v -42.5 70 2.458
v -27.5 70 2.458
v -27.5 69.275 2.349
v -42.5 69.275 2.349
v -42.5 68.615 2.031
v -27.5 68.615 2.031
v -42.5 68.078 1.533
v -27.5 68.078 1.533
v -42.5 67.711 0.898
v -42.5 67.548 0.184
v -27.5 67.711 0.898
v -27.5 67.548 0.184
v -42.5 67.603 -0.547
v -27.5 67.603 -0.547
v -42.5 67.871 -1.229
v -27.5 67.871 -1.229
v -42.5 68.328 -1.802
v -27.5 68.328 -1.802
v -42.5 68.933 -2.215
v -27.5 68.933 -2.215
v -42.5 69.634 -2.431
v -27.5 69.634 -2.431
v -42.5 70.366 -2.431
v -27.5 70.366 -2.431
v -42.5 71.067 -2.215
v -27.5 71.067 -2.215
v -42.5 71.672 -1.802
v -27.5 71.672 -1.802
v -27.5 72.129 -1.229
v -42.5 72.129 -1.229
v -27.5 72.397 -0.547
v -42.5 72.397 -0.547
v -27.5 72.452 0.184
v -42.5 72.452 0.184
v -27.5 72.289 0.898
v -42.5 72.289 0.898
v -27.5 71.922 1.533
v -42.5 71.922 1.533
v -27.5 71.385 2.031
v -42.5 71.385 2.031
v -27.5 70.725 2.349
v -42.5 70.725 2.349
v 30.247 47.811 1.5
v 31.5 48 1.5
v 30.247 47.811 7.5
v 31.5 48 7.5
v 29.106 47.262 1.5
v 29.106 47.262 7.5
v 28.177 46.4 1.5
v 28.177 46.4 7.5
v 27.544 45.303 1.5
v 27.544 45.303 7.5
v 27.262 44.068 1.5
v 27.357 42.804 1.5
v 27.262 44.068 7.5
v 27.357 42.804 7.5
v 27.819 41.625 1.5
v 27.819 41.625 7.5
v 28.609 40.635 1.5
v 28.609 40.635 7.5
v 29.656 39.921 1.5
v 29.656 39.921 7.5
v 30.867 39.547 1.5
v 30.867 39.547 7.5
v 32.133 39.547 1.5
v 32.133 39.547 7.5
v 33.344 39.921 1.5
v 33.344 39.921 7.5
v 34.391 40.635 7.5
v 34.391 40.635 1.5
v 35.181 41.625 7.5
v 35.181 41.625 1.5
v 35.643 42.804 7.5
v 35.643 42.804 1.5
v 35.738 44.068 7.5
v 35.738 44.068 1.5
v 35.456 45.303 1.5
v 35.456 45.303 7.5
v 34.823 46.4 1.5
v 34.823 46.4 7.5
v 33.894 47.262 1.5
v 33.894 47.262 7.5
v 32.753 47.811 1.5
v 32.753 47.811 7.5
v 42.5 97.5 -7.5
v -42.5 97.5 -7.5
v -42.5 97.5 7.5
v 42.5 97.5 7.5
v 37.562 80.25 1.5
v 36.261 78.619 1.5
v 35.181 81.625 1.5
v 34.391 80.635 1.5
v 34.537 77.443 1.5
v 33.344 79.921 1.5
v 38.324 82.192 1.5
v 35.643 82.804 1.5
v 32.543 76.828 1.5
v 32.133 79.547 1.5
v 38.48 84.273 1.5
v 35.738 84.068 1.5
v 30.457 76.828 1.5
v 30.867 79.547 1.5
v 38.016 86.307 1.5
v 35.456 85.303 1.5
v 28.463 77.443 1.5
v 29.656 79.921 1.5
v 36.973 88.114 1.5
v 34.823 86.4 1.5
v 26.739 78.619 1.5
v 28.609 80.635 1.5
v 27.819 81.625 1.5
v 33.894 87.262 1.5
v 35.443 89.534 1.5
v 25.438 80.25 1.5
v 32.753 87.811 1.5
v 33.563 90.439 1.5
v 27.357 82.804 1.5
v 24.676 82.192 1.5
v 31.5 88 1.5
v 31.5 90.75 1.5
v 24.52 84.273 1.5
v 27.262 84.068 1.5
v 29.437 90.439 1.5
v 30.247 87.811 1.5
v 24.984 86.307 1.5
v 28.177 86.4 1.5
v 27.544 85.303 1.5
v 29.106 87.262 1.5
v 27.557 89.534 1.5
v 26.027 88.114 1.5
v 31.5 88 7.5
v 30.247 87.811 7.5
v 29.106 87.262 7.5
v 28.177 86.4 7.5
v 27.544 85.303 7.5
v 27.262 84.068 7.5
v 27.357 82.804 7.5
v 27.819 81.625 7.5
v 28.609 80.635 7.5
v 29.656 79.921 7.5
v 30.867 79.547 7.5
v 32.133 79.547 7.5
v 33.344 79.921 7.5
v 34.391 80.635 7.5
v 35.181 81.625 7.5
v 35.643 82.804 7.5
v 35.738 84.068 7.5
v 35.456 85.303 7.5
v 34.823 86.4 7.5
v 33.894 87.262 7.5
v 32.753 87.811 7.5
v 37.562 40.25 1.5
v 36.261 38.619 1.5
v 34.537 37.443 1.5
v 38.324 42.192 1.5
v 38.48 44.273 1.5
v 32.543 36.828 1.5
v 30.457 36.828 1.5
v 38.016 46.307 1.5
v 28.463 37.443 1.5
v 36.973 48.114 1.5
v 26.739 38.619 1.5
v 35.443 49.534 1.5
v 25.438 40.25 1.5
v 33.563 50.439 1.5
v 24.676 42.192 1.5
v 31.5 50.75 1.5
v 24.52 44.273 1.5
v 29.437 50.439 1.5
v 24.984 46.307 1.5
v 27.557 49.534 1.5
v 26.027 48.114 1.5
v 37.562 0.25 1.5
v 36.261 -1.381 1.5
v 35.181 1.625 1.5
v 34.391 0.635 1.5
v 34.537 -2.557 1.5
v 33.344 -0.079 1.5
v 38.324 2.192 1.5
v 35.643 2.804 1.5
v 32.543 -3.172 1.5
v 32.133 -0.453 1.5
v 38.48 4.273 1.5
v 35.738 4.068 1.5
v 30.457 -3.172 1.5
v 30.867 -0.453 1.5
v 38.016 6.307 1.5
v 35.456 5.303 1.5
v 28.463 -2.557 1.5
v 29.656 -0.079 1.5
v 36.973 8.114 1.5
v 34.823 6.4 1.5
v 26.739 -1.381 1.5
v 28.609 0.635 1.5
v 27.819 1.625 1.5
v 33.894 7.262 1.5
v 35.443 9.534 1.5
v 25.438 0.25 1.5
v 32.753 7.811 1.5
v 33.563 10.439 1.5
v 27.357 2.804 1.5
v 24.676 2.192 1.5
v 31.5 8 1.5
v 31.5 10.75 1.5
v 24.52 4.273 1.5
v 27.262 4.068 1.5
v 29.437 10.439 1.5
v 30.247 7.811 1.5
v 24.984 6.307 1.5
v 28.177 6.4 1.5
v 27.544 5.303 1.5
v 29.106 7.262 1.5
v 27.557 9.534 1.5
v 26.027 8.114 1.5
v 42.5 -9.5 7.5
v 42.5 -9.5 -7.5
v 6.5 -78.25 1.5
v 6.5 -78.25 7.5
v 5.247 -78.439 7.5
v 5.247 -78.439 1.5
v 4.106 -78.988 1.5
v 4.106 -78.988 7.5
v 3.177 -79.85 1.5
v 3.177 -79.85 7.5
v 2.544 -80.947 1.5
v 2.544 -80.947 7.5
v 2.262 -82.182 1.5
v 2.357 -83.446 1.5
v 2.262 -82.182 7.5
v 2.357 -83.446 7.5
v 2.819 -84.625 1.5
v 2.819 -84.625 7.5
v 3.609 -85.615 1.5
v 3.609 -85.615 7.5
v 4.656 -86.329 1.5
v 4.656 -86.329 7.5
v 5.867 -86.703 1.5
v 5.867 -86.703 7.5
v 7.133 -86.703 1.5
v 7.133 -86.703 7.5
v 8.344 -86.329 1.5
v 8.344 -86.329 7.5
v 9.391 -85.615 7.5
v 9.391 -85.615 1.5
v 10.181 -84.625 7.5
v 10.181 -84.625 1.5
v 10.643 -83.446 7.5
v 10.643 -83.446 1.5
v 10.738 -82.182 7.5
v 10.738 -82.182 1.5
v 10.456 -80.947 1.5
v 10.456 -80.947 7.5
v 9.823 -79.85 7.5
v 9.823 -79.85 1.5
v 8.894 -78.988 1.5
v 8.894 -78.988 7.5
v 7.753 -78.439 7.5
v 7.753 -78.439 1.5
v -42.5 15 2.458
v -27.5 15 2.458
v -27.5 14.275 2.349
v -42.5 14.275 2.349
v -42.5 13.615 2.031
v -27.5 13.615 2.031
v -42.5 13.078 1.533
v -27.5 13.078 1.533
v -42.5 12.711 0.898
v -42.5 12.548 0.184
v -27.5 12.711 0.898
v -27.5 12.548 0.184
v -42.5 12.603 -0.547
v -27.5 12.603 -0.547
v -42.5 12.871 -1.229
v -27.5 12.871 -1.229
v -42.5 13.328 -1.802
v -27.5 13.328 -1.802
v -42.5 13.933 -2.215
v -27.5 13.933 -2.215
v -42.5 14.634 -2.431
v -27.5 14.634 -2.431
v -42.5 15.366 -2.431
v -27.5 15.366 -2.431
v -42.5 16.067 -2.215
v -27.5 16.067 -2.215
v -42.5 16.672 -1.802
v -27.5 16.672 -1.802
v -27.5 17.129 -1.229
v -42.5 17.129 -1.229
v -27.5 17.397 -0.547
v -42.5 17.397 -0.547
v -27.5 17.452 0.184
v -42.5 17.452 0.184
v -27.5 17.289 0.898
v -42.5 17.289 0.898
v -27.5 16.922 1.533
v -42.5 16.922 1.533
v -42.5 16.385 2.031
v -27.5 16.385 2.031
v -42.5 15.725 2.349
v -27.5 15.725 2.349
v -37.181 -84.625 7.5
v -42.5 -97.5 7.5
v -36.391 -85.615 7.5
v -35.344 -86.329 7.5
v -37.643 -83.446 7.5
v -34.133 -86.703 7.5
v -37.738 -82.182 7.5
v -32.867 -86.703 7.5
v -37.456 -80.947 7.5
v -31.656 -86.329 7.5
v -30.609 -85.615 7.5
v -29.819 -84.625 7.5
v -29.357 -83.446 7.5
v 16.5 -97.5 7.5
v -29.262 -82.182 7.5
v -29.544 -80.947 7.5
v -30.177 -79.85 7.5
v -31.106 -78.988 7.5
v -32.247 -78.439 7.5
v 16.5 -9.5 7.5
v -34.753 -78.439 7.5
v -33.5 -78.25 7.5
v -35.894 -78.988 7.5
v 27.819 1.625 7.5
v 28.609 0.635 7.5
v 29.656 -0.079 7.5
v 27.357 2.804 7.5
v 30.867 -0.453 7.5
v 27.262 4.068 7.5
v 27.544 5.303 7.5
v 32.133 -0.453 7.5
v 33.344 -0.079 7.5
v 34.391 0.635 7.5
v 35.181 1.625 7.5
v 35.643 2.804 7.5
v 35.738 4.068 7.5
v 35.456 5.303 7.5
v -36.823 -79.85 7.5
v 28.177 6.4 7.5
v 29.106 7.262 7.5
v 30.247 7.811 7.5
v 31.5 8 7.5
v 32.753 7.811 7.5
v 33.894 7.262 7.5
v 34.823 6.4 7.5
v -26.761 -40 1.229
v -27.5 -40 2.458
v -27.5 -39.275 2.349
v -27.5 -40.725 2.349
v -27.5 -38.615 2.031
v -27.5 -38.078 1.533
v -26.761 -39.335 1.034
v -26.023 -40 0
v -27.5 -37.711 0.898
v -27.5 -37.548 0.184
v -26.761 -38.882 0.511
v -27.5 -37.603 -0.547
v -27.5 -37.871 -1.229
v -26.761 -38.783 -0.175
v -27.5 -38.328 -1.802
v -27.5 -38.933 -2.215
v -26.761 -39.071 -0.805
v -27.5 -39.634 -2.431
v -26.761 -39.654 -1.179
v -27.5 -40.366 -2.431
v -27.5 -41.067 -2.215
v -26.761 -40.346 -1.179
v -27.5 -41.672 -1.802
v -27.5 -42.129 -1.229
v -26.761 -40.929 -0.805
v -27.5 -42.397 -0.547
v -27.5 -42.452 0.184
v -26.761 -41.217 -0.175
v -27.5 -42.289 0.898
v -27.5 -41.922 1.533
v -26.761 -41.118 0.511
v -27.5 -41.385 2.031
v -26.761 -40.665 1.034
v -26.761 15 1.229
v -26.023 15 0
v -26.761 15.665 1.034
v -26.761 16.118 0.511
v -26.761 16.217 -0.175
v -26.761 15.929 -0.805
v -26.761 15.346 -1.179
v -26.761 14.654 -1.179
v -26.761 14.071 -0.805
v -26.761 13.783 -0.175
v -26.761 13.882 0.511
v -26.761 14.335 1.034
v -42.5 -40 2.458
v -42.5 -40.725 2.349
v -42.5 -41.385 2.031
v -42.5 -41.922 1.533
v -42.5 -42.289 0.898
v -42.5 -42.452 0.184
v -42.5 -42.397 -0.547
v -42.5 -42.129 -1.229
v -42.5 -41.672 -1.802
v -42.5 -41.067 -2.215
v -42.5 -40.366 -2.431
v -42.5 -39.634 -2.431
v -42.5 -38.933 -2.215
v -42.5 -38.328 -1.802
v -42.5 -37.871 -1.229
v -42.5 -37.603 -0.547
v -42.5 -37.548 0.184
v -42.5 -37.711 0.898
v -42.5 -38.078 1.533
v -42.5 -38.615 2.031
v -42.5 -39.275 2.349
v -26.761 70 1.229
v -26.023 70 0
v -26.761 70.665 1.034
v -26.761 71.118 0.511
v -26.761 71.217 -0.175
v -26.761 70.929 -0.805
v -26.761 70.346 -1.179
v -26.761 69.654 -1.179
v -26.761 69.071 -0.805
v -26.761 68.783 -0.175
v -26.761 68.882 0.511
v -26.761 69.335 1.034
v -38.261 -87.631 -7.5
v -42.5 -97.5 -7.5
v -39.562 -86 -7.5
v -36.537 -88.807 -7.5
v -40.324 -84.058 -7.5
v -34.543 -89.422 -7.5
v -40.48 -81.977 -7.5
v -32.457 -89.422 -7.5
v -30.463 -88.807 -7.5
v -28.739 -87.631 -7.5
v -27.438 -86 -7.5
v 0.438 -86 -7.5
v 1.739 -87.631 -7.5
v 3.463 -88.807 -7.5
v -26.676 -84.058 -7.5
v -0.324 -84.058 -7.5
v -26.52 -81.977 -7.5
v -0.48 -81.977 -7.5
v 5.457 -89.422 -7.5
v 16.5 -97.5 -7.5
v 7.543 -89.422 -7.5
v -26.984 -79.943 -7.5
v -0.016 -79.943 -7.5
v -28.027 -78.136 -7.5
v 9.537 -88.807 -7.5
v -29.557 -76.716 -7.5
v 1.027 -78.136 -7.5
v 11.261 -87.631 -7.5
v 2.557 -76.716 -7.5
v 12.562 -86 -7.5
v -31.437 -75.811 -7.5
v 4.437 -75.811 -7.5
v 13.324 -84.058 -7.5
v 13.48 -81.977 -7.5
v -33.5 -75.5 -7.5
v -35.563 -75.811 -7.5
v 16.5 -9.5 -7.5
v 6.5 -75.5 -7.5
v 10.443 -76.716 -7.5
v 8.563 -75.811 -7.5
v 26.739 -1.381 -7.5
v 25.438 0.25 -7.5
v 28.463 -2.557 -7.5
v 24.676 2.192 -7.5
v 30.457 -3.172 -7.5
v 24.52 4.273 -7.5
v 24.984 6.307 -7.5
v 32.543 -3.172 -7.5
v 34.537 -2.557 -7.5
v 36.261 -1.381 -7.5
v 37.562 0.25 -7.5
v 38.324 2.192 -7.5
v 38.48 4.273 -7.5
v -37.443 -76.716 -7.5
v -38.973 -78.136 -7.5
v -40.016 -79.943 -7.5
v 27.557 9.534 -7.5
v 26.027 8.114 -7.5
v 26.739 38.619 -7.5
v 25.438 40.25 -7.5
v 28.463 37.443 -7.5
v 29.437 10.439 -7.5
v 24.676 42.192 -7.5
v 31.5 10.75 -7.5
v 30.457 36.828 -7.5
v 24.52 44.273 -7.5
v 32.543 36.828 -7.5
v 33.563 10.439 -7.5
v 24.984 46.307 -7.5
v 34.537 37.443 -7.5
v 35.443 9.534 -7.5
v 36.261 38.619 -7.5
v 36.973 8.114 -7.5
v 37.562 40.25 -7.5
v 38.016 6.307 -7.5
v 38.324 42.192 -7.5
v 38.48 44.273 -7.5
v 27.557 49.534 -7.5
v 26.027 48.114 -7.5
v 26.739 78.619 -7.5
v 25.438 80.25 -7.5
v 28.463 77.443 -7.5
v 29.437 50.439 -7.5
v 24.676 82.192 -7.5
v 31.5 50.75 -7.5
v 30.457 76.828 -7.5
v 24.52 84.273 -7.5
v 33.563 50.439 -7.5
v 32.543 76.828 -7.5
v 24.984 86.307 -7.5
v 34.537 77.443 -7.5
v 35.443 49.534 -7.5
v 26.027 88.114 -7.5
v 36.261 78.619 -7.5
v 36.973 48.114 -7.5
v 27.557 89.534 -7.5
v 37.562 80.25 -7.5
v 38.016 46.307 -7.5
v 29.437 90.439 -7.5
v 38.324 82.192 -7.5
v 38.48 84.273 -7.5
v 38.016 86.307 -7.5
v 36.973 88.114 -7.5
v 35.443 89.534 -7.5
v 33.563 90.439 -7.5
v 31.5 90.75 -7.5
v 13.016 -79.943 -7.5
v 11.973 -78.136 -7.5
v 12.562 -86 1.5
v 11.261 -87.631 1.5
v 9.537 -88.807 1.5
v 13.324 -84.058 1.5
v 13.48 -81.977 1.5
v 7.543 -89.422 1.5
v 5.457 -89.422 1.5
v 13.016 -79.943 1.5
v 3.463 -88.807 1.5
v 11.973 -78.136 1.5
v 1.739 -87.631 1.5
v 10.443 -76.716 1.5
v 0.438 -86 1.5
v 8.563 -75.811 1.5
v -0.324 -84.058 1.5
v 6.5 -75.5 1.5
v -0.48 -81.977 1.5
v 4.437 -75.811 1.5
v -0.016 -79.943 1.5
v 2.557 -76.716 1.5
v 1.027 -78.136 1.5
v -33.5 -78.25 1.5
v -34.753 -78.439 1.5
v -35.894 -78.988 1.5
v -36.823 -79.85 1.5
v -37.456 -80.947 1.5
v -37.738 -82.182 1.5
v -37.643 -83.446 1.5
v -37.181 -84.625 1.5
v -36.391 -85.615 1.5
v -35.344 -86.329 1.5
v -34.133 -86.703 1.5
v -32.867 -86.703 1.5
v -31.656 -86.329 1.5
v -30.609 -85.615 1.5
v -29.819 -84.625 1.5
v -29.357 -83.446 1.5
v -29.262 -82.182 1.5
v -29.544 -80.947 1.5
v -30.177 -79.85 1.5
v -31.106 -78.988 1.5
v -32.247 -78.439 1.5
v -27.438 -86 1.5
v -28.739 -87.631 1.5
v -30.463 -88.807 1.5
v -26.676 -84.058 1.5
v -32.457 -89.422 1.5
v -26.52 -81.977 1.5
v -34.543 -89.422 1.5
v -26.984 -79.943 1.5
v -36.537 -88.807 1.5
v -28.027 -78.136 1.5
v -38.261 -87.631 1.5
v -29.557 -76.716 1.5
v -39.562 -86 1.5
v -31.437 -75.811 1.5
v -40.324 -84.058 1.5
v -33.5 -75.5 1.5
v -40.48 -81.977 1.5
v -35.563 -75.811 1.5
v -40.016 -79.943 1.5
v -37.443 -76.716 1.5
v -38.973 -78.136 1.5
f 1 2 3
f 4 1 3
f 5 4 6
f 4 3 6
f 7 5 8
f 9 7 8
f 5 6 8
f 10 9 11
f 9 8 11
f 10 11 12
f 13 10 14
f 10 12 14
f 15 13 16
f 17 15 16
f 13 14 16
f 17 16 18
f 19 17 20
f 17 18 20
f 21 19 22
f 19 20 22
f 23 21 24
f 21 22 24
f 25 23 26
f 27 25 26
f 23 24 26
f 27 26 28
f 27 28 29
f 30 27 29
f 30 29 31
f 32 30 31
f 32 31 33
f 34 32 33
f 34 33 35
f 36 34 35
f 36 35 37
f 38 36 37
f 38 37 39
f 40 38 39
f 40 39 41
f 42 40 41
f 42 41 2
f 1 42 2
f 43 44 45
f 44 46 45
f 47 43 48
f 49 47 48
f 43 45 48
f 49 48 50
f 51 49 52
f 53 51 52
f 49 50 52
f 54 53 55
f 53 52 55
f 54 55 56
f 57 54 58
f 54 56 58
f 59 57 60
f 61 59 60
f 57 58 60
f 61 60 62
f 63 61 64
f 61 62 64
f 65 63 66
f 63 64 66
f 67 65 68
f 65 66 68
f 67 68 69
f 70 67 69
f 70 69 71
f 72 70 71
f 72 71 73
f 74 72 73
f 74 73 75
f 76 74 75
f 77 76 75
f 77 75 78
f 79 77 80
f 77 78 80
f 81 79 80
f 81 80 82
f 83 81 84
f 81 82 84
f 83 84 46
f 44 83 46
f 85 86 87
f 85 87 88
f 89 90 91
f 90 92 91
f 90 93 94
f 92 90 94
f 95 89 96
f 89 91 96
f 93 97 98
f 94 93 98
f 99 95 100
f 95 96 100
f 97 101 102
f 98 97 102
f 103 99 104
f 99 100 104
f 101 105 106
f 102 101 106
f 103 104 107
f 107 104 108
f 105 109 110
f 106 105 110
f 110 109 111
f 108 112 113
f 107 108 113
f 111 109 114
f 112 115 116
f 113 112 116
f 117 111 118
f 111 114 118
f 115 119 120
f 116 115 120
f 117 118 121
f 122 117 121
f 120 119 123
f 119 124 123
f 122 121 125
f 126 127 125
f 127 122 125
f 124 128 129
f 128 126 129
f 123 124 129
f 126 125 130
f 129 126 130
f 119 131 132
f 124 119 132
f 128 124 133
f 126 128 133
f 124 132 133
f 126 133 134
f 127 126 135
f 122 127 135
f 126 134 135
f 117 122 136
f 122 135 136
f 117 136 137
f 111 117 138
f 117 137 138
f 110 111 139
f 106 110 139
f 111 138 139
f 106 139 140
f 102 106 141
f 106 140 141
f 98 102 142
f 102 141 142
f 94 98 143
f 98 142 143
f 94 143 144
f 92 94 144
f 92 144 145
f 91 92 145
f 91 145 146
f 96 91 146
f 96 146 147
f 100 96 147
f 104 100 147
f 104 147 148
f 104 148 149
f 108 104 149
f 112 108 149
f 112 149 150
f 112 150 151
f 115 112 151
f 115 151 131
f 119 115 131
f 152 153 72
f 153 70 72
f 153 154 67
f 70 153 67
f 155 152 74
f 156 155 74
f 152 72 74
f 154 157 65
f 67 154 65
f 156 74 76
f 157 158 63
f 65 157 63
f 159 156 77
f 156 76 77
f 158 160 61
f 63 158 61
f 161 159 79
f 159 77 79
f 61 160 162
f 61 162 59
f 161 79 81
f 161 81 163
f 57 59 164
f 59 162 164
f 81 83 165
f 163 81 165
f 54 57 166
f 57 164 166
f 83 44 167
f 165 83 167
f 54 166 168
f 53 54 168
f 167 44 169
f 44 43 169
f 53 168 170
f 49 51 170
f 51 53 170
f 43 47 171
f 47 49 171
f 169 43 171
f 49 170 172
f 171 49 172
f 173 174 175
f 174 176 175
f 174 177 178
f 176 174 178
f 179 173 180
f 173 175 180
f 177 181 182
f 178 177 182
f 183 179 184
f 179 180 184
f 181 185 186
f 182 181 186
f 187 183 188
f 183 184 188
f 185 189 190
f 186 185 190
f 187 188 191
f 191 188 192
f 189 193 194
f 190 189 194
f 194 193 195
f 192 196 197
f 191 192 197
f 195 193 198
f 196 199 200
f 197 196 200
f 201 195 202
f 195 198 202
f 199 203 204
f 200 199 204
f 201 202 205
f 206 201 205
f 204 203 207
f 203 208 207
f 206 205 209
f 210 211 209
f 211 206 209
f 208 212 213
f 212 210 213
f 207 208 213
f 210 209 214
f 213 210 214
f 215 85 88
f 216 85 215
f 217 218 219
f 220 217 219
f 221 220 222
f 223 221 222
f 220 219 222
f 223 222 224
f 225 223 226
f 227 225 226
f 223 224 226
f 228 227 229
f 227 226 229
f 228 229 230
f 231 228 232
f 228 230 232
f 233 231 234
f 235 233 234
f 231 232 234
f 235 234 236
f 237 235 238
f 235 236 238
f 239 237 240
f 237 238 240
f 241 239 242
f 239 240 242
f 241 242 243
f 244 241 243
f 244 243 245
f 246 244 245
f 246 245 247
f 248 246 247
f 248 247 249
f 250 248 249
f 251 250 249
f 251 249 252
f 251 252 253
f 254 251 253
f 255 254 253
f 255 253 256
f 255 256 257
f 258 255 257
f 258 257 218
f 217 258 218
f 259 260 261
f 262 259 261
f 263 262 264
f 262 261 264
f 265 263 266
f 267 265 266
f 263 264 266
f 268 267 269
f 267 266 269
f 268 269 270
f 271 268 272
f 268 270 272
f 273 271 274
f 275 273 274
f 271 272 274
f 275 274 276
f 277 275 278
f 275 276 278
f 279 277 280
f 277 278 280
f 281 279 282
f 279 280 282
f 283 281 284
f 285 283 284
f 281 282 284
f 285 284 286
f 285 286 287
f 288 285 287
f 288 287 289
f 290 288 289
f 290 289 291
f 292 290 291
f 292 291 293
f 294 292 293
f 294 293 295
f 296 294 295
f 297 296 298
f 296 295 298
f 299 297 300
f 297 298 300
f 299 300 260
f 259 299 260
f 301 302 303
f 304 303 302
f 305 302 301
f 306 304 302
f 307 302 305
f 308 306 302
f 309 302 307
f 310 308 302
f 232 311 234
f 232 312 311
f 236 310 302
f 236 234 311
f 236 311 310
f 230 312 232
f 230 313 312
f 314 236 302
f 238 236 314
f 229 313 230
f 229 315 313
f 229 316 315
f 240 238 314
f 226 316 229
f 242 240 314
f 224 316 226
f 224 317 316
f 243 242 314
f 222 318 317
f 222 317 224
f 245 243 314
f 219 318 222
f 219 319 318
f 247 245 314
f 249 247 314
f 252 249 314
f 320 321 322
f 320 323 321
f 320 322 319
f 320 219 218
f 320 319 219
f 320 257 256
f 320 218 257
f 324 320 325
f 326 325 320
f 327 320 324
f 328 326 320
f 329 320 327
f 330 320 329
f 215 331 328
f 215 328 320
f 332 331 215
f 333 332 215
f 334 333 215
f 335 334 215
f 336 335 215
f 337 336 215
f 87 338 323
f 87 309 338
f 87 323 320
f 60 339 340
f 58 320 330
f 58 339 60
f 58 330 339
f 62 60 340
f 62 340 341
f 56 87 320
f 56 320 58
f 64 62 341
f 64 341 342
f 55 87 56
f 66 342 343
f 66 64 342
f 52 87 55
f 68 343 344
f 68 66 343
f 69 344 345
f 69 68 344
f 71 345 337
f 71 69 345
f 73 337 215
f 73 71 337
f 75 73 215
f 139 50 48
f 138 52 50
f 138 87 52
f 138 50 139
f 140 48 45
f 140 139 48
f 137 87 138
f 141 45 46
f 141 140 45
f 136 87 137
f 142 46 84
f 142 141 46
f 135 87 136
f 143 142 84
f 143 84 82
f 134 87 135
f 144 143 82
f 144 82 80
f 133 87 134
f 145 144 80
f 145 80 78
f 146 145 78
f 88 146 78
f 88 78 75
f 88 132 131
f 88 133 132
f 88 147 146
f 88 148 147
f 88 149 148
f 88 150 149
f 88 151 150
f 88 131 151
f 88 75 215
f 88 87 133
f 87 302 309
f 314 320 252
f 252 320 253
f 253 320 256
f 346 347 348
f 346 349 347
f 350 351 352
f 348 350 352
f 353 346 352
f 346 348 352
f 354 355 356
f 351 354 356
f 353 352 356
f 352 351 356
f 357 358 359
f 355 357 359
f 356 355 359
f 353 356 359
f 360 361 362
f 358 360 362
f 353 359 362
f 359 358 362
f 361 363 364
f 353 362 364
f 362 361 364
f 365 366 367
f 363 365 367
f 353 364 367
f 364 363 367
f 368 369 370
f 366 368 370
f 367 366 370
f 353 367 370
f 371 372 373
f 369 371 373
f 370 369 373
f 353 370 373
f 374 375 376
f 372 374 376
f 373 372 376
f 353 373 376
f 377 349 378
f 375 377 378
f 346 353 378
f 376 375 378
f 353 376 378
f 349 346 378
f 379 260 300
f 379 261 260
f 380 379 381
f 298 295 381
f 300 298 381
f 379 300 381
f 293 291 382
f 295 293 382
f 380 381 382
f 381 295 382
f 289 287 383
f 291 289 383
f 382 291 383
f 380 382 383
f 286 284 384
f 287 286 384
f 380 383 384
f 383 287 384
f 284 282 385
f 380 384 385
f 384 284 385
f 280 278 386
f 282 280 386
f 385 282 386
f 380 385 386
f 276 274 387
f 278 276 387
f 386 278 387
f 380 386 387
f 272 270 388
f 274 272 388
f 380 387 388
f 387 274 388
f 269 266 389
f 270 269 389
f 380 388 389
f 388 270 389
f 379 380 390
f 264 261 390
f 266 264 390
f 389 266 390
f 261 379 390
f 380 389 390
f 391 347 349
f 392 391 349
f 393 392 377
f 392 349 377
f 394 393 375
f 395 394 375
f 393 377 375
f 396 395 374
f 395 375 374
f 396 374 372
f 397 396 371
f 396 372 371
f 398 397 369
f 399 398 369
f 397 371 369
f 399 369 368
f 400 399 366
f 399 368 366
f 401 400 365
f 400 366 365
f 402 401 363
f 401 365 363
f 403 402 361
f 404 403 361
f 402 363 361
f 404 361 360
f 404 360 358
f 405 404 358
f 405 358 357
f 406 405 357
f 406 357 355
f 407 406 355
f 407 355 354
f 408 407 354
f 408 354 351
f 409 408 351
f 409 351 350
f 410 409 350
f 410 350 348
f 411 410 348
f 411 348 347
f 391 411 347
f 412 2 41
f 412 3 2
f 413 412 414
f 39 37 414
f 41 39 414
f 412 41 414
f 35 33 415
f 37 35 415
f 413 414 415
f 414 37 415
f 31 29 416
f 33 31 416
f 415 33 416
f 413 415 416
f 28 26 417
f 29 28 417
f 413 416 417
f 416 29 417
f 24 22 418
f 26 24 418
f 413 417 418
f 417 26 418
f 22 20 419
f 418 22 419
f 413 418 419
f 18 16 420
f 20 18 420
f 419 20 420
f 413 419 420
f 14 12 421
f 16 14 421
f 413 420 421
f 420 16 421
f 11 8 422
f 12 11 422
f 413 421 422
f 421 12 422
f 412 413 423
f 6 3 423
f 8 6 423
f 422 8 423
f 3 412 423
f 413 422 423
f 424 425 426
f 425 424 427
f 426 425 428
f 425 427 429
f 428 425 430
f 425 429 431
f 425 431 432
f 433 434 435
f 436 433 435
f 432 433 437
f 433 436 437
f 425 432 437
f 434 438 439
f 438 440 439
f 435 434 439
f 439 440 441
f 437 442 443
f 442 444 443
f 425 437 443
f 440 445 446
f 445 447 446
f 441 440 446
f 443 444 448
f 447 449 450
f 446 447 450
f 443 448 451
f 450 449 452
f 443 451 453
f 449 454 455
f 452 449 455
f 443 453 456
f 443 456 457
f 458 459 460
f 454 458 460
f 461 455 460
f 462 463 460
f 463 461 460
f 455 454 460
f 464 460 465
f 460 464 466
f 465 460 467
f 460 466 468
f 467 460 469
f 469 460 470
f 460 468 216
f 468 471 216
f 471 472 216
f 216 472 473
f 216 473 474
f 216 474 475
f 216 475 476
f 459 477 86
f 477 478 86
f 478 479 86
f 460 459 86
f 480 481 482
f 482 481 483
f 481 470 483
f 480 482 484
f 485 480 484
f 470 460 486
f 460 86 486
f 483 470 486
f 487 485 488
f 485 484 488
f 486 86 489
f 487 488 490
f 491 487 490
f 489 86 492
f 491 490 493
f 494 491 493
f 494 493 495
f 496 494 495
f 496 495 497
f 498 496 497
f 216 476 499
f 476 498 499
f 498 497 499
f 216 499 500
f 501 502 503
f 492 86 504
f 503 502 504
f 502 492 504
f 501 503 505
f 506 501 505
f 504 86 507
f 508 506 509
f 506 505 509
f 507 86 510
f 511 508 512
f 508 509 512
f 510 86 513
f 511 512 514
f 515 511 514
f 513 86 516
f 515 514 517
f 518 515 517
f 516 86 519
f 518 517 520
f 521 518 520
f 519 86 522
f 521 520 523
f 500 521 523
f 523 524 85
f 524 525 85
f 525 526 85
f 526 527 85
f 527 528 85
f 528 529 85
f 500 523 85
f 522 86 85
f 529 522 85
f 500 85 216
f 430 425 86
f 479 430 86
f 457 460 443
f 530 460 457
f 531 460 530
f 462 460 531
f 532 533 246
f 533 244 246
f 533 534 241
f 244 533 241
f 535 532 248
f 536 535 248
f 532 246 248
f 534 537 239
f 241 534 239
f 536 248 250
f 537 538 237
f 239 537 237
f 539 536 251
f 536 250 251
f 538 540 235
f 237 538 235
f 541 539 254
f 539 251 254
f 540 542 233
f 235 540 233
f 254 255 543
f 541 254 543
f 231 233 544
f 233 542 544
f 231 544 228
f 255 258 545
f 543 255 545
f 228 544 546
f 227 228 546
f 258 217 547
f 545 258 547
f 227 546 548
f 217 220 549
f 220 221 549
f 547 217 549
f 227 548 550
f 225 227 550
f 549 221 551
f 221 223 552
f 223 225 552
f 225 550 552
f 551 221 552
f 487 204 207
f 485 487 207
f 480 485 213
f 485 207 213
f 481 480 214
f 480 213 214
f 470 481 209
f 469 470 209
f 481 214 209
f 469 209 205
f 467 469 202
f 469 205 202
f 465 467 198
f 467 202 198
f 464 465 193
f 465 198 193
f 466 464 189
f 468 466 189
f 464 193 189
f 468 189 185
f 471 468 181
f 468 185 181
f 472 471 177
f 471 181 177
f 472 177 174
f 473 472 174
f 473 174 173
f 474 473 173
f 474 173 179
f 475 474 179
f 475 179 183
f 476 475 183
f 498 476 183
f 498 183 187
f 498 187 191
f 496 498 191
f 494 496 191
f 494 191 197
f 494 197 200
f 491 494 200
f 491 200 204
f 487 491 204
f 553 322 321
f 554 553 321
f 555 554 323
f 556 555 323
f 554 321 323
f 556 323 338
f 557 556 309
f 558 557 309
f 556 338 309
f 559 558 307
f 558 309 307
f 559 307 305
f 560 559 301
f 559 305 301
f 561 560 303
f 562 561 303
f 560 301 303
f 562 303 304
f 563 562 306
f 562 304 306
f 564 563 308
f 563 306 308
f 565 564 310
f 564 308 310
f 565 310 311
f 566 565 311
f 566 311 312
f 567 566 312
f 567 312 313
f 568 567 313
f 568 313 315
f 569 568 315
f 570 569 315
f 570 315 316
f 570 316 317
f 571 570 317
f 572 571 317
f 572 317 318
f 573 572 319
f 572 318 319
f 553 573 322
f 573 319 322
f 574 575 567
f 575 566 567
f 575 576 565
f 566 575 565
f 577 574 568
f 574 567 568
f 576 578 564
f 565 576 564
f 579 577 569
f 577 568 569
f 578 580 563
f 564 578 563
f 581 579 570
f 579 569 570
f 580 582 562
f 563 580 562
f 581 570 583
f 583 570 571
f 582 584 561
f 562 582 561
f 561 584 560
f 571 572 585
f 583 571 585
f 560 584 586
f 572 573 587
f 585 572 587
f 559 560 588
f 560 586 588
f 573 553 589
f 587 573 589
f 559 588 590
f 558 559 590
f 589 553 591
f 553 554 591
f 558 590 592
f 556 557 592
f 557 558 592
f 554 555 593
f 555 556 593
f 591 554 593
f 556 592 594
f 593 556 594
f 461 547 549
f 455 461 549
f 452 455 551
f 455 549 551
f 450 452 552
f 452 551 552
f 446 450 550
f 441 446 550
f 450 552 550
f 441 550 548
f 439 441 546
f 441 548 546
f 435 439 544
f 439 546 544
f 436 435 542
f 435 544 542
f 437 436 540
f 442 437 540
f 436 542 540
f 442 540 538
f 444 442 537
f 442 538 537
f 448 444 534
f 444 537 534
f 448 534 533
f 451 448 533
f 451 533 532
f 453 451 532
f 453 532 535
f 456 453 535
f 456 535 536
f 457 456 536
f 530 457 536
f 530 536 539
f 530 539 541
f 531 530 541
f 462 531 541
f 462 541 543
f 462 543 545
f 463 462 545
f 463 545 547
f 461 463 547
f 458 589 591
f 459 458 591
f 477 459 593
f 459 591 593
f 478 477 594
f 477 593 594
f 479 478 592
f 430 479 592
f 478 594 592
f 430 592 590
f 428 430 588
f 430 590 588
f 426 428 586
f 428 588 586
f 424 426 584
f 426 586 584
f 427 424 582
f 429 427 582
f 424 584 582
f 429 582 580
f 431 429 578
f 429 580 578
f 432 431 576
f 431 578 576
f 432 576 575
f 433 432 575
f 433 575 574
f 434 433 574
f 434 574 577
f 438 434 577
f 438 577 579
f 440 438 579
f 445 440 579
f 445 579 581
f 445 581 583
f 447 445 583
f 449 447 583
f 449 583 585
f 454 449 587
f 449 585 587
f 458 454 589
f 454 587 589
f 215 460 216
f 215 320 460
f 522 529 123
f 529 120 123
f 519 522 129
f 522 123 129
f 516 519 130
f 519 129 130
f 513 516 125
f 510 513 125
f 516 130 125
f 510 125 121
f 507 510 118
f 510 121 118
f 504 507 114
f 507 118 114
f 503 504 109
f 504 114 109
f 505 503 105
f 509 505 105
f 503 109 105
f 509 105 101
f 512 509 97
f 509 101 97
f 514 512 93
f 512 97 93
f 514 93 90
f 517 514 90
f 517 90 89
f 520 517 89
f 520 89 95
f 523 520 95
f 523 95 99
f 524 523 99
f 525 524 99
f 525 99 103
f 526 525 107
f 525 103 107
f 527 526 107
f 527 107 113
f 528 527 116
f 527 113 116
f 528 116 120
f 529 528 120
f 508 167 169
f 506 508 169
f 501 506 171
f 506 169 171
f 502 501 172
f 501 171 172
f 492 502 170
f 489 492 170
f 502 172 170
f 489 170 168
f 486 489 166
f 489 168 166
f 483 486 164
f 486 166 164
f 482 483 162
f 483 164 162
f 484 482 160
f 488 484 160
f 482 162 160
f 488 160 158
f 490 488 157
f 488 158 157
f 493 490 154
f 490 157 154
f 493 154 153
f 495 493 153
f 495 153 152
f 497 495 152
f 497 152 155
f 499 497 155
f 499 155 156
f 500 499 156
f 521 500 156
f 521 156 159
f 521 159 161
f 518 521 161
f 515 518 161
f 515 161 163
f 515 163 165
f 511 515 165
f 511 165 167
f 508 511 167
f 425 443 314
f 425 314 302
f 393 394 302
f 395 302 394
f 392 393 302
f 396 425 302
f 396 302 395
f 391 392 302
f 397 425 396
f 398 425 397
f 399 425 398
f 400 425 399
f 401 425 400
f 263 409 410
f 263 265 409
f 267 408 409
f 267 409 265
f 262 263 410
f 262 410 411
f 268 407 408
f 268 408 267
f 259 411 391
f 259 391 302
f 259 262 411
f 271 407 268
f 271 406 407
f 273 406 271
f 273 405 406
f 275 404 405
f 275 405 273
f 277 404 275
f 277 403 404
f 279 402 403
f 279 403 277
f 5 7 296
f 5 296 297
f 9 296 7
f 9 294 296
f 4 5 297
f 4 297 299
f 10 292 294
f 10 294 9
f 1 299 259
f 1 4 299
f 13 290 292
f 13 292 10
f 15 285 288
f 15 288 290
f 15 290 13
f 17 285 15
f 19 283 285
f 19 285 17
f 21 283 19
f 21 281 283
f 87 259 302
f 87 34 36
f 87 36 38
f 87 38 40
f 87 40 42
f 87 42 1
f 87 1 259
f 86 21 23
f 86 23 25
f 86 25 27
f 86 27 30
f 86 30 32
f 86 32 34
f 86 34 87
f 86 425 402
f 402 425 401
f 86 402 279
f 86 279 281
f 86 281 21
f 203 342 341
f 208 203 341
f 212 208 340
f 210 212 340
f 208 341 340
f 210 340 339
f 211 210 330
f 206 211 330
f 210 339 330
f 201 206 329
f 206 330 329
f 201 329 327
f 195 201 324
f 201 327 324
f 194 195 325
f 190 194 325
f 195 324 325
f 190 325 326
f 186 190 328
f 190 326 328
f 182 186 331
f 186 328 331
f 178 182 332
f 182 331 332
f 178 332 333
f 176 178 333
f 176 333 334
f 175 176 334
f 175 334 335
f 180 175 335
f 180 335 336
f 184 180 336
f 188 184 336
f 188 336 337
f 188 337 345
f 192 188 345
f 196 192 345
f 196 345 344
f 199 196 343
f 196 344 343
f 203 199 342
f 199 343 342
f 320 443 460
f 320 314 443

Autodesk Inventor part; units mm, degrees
ref_plane "YZ Plane" through (0, 0, 0) normal (1, 0, 0) x (0, 1, 0)
ref_plane "XZ Plane" through (0, 0, 0) normal (0, 1, 0) x (-1, 0, 0)
ref_plane "XY Plane" through (0, 0, 0) normal (0, 0, 1) x (1, 0, 0)
sketch "Sketch5" plane through (0, 0, 0) normal (0, 0, 1) x (1, 0, 0)
  line L0 (-42.5, 97.5) -> (42.5, 97.5)
  line L1 (42.5, 97.5) -> (42.5, -97.5)
  line L2 (42.5, -97.5) -> (-42.5, -97.5)
  line L3 (-42.5, -97.5) -> (-42.5, 97.5)
  point P0 (0, 0)
  point P1 (0, 97.5)
  point P2 (42.5, 0)
  point P3 (-42.5, 0)
  dimension "d8" = 195
  dimension "d9" = 85
extrude "Extrusion5" add sketch "Sketch5" along normal mid plane 15
sketch "Sketch6" plane through (0, 0, 7.5) normal (0, 0, 1) x (1, 0, 0)
  line L0 (42.5, -97.5) -> (16.5, -97.5)
  line L1 (16.5, -97.5) -> (16.5, -9.5)
  line L2 (16.5, -9.5) -> (42.5, -9.5)
  line L3 (42.5, -9.5) -> (42.5, -97.5)
  point P0 (0, 0)
  dimension "d12" = 88
  dimension "d13" = 26
extrude "Extrusion6" cut sketch "Sketch6" against normal blind 15
sketch "Sketch7" plane through (0, 0, -7.5) normal (0, 0, -1) x (-1, 0, 0)
  line L0 (42.5, 97.5) -> (-42.5, 97.5)
  circle A0 centre (-31.5, 83.75) radius 4.25
  circle A1 centre (-31.5, 43.75) radius 4.25
  circle A2 centre (-31.5, 3.75) radius 4.25
  circle A3 centre (-6.5, -82.5) radius 4.25
  circle A4 centre (33.5, -82.5) radius 4.25
  line L1 (42.5, -97.5) -> (42.5, 97.5) projected
  line L2 (-16.5, -9.5) -> (-16.5, -97.5) projected
  point P0 (0, 0)
  dimension "d18" = 8.5
  dimension "d19" = 40
  dimension "d20" = 40
  dimension "d21" = 13.75
  dimension "d22" = 40
  dimension "d66" = 74
  dimension "d68" = 59
  dimension "d70" = 10
hole "Hole1" at (31.5, 83.75, -7.5) at (31.5, 43.75, -7.5) at (31.5, 3.75, -7.5) at (-33.5, -82.5, -7.5) at (6.5, -82.5, -7.5) direction (0, 0, 1) diameter 8.5 end through all counterbore diameter 14 counterbore depth 9 clearance for "Socket Head Cap Screw DIN EN ISO 4762" size "M8" standard "DIN"
sketch "Sketch9" plane through (-42.5, -97.5, 7.5) normal (-1, 0, 0) x (0, 0, 1)
  circle A0 centre (-7.5, 167.5) radius 3
  circle A1 centre (-7.5, 112.5) radius 3
  circle A2 centre (-7.5, 57.5) radius 3
  line L0 (0, 0) -> (-15, 0) projected
  point P0 (-7.5, 97.5)
  dimension "d55" = 55
  dimension "d56" = 55
  dimension "d57" = 6
  dimension "d65" = 57.5
hole "Hole3" at (-42.5, -40, 0) at (-42.5, 15, 0) at (-42.5, 70, 0) direction (1, 0, 0) diameter 4.917 depth 15 tip angle 118 thread size "M6x1" class "6H" standard "ISO Metric profile"
equation "\"d20\" = d19"
properties part number "BC-10013" material "Alumínio 7075"
